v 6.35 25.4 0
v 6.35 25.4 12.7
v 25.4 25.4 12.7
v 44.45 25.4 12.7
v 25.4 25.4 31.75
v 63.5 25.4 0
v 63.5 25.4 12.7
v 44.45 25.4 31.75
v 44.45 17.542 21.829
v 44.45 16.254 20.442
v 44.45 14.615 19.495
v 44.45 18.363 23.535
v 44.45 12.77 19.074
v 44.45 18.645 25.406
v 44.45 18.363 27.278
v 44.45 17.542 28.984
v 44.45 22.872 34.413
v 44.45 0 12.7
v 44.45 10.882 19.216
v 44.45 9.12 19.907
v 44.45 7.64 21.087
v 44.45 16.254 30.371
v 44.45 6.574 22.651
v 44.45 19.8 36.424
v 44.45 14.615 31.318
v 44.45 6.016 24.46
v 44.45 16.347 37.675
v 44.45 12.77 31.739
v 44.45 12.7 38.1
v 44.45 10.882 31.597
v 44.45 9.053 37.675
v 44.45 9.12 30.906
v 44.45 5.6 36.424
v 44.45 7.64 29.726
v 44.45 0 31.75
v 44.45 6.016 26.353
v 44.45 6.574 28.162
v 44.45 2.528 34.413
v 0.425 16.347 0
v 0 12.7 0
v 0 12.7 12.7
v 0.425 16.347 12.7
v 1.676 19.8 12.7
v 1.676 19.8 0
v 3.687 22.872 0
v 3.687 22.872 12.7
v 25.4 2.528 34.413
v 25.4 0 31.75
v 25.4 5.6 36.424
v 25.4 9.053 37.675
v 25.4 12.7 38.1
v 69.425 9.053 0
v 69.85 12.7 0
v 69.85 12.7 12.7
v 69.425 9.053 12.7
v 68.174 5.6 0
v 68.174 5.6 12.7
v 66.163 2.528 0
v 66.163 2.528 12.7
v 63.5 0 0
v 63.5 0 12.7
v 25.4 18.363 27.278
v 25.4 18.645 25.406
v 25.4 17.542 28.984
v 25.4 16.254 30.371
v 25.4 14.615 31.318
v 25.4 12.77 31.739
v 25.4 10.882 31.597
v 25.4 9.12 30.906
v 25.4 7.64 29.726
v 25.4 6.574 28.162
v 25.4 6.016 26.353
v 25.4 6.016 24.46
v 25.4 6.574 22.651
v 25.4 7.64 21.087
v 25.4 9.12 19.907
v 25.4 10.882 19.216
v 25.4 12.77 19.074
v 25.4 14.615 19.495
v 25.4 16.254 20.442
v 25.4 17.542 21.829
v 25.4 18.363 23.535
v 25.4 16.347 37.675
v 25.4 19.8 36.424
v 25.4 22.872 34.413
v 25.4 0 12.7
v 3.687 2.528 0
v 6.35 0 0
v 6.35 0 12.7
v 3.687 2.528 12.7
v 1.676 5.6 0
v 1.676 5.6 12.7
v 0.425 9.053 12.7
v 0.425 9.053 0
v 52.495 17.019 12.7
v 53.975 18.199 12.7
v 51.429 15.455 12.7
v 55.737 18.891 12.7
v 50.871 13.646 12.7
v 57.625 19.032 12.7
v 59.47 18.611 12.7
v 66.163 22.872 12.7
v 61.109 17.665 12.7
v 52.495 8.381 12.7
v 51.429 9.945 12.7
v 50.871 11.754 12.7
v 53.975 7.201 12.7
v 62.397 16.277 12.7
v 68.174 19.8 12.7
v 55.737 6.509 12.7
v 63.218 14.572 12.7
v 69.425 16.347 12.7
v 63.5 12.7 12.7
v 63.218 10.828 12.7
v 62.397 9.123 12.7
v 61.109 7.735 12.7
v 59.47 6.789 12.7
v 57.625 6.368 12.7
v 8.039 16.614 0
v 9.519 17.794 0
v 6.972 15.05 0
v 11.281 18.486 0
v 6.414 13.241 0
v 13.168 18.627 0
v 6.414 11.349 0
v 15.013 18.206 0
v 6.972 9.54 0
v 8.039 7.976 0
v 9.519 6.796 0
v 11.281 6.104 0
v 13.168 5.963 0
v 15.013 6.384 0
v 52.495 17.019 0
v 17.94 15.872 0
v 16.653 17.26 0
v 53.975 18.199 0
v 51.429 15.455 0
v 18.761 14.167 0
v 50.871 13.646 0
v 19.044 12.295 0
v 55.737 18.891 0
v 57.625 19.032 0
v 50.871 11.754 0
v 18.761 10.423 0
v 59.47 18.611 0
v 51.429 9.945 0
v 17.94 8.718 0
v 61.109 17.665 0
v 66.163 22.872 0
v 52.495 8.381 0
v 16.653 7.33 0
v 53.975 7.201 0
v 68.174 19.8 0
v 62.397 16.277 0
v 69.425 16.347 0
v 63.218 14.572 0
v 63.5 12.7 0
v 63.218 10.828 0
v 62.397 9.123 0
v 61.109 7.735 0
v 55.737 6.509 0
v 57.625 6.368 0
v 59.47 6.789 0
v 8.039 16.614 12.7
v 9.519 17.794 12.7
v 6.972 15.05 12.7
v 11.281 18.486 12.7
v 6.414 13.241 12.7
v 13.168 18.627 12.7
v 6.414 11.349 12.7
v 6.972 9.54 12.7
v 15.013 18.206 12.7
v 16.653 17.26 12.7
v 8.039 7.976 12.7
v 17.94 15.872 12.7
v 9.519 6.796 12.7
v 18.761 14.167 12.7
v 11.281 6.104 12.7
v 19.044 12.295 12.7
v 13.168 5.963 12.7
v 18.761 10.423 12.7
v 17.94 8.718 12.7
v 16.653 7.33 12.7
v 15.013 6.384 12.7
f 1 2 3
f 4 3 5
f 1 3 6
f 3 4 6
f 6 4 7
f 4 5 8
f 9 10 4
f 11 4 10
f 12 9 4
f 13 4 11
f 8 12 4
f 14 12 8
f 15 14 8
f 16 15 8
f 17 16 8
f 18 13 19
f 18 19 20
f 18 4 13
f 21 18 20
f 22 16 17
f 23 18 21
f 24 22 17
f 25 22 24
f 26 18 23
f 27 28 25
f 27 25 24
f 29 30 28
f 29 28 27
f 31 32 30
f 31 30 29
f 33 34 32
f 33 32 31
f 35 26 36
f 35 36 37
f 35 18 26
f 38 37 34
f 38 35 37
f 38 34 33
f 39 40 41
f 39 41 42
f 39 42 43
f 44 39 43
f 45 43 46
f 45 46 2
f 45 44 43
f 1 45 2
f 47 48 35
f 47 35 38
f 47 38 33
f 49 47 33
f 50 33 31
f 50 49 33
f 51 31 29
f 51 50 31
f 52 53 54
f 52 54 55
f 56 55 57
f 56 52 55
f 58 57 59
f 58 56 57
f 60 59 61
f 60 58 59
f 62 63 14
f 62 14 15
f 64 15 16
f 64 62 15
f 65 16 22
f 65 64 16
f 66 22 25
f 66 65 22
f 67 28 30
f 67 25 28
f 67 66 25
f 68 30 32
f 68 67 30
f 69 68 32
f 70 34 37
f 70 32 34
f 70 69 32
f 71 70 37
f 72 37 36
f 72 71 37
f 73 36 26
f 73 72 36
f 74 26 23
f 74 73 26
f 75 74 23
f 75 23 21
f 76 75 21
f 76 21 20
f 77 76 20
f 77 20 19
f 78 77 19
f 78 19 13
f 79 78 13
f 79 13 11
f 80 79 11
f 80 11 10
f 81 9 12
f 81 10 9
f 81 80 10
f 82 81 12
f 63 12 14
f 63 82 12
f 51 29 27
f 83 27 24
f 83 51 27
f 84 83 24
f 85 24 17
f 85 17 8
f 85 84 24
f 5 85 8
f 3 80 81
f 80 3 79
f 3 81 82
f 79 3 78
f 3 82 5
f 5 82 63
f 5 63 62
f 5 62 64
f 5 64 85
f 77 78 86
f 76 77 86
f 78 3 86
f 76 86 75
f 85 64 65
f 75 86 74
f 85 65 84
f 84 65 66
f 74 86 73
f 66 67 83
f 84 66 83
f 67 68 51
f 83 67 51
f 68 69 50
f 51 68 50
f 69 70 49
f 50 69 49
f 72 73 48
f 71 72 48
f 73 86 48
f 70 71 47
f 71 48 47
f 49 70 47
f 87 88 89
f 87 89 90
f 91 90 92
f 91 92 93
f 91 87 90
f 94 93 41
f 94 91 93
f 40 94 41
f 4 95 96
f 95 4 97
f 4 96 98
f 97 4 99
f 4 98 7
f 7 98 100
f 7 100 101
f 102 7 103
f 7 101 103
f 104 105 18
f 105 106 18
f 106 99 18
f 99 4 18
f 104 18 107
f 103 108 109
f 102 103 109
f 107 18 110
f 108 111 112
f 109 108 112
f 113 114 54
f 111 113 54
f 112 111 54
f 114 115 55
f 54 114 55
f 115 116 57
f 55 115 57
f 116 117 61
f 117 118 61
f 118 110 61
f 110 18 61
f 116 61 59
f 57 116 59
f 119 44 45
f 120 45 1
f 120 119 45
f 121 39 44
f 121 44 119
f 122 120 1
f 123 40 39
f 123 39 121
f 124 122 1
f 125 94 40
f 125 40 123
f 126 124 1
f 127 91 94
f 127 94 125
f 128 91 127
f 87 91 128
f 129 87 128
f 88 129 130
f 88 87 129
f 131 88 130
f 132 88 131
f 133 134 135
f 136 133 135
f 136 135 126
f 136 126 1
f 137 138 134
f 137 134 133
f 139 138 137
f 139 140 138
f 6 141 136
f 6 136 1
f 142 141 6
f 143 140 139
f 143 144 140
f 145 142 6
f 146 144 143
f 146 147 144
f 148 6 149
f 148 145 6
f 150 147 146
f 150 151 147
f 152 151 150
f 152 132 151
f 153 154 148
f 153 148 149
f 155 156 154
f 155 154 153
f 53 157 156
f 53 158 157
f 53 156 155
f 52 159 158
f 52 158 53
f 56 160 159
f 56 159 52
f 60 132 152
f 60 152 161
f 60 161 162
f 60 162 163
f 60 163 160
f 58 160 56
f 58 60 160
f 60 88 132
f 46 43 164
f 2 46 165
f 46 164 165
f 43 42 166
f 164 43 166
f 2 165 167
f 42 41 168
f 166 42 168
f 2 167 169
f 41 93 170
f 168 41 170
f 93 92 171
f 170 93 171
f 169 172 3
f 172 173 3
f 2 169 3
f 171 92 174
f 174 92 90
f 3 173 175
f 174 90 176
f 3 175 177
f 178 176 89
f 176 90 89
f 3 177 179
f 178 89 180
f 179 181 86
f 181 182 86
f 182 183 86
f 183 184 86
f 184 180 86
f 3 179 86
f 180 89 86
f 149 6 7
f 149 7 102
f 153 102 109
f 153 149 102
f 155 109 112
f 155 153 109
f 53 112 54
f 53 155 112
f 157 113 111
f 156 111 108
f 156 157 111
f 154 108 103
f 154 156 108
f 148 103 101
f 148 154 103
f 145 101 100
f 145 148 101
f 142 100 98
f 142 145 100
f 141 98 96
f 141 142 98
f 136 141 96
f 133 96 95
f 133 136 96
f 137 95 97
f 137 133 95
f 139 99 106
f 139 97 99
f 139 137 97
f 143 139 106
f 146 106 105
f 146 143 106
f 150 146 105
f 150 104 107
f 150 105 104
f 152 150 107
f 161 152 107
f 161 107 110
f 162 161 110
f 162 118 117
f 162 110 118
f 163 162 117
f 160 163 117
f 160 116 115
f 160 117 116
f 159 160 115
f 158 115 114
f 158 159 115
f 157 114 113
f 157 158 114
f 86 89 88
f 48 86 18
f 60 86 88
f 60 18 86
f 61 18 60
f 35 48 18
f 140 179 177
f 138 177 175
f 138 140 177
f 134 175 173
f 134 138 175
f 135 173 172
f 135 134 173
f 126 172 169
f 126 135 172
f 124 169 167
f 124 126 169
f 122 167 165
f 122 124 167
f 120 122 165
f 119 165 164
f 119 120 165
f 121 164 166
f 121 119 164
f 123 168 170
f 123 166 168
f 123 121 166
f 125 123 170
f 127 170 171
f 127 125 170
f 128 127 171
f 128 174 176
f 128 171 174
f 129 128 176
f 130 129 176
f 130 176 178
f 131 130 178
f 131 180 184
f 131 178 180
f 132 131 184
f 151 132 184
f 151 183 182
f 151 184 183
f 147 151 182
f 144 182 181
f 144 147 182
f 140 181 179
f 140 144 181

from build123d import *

# Parameters (mm, degrees)
F0_W      = 69.85
F0_H      = 38.1
F1_DEPTH  = 25.4
F2_W      = 25.4
F2_H      = 25.4
F3_DEPTH  = 25.4
F4_W      = 25.4
F4_H      = 25.4
F5_DEPTH  = 25.4
F7_DEPTH  = 25.4
F9_DEPTH  = 25.4
F11_DEPTH = 50.8
F12_R     = 6.35
F13_DEPTH = 25.4
F14_R     = 6.35
F15_DEPTH = 50.8


with BuildPart() as f1:
    # F0 (on Front) → F1 (new body)
    with BuildSketch(Plane.XZ):
        with Locations((34.925, 19.05)):
            Rectangle(F0_W, F0_H)
    extrude(amount=-F1_DEPTH)

    # F2 (on Front) → F3 (cut)
    with BuildSketch(Plane.XZ):
        with Locations((57.15, 25.4)):
            Rectangle(F2_W, F2_H)
    extrude(amount=-F3_DEPTH, mode=Mode.SUBTRACT)

    # F4 (on Front) → F5 (cut)
    with BuildSketch(Plane.XZ):
        with Locations((12.7, 25.4)):
            Rectangle(F4_W, F4_H)
    extrude(amount=-F5_DEPTH, mode=Mode.SUBTRACT)

    # F6 (on Top) → F7 (cut)
    with BuildSketch(Plane.XY):
        with BuildLine():
            ThreePointArc((63.5, 25.4), (68.174032, 19.799516), (69.85, 12.7))
            Line((69.85, 12.7), (69.85, 25.4))
            Line((69.85, 25.4), (63.5, 25.4))
        make_face()
        with BuildLine():
            ThreePointArc((69.85, 12.7), (68.174032, 5.600484), (63.5, 0))
            Line((63.5, 0), (69.85, 0))
            Line((69.85, 0), (69.85, 12.7))
        make_face()
    extrude(amount=F7_DEPTH, mode=Mode.SUBTRACT)

    # F8 (on Top) → F9 (cut)
    with BuildSketch(Plane.XY):
        with BuildLine():
            ThreePointArc((6.35, 0), (1.675968, 5.600484), (0, 12.7))
            Line((0, 12.7), (0, 0))
            Line((0, 0), (6.35, 0))
        make_face()
        with BuildLine():
            ThreePointArc((0, 12.7), (1.675968, 19.799516), (6.35, 25.4))
            Line((6.35, 25.4), (0, 25.4))
            Line((0, 25.4), (0, 12.7))
        make_face()
    extrude(amount=F9_DEPTH, mode=Mode.SUBTRACT)

    # F10 (on Right) → F11 (cut)
    with BuildSketch(Plane.YZ):
        with BuildLine():
            ThreePointArc((0, 31.75), (5.600484, 36.424032), (12.7, 38.1))
            Line((12.7, 38.1), (0, 38.1))
            Line((0, 38.1), (0, 31.75))
        make_face()
        with BuildLine():
            ThreePointArc((12.7, 38.1), (19.799516, 36.424032), (25.4, 31.75))
            Line((25.4, 31.75), (25.4, 38.1))
            Line((25.4, 38.1), (12.7, 38.1))
        make_face()
    extrude(amount=F11_DEPTH, mode=Mode.SUBTRACT)

    # F12 (on Top) → F13 (cut)
    with BuildSketch(Plane.XY):
        with Locations((12.693542, 12.295053)):
            Circle(F12_R)
        with Locations((57.15, 12.7)):
            Circle(F12_R)
    extrude(amount=F13_DEPTH, mode=Mode.SUBTRACT)

    # F14 (on Right) → F15 (cut)
    with BuildSketch(Plane.YZ):
        with Locations((12.295053, 25.406458)):
            Circle(F14_R)
    extrude(amount=F15_DEPTH, mode=Mode.SUBTRACT)


solid = f1.part
